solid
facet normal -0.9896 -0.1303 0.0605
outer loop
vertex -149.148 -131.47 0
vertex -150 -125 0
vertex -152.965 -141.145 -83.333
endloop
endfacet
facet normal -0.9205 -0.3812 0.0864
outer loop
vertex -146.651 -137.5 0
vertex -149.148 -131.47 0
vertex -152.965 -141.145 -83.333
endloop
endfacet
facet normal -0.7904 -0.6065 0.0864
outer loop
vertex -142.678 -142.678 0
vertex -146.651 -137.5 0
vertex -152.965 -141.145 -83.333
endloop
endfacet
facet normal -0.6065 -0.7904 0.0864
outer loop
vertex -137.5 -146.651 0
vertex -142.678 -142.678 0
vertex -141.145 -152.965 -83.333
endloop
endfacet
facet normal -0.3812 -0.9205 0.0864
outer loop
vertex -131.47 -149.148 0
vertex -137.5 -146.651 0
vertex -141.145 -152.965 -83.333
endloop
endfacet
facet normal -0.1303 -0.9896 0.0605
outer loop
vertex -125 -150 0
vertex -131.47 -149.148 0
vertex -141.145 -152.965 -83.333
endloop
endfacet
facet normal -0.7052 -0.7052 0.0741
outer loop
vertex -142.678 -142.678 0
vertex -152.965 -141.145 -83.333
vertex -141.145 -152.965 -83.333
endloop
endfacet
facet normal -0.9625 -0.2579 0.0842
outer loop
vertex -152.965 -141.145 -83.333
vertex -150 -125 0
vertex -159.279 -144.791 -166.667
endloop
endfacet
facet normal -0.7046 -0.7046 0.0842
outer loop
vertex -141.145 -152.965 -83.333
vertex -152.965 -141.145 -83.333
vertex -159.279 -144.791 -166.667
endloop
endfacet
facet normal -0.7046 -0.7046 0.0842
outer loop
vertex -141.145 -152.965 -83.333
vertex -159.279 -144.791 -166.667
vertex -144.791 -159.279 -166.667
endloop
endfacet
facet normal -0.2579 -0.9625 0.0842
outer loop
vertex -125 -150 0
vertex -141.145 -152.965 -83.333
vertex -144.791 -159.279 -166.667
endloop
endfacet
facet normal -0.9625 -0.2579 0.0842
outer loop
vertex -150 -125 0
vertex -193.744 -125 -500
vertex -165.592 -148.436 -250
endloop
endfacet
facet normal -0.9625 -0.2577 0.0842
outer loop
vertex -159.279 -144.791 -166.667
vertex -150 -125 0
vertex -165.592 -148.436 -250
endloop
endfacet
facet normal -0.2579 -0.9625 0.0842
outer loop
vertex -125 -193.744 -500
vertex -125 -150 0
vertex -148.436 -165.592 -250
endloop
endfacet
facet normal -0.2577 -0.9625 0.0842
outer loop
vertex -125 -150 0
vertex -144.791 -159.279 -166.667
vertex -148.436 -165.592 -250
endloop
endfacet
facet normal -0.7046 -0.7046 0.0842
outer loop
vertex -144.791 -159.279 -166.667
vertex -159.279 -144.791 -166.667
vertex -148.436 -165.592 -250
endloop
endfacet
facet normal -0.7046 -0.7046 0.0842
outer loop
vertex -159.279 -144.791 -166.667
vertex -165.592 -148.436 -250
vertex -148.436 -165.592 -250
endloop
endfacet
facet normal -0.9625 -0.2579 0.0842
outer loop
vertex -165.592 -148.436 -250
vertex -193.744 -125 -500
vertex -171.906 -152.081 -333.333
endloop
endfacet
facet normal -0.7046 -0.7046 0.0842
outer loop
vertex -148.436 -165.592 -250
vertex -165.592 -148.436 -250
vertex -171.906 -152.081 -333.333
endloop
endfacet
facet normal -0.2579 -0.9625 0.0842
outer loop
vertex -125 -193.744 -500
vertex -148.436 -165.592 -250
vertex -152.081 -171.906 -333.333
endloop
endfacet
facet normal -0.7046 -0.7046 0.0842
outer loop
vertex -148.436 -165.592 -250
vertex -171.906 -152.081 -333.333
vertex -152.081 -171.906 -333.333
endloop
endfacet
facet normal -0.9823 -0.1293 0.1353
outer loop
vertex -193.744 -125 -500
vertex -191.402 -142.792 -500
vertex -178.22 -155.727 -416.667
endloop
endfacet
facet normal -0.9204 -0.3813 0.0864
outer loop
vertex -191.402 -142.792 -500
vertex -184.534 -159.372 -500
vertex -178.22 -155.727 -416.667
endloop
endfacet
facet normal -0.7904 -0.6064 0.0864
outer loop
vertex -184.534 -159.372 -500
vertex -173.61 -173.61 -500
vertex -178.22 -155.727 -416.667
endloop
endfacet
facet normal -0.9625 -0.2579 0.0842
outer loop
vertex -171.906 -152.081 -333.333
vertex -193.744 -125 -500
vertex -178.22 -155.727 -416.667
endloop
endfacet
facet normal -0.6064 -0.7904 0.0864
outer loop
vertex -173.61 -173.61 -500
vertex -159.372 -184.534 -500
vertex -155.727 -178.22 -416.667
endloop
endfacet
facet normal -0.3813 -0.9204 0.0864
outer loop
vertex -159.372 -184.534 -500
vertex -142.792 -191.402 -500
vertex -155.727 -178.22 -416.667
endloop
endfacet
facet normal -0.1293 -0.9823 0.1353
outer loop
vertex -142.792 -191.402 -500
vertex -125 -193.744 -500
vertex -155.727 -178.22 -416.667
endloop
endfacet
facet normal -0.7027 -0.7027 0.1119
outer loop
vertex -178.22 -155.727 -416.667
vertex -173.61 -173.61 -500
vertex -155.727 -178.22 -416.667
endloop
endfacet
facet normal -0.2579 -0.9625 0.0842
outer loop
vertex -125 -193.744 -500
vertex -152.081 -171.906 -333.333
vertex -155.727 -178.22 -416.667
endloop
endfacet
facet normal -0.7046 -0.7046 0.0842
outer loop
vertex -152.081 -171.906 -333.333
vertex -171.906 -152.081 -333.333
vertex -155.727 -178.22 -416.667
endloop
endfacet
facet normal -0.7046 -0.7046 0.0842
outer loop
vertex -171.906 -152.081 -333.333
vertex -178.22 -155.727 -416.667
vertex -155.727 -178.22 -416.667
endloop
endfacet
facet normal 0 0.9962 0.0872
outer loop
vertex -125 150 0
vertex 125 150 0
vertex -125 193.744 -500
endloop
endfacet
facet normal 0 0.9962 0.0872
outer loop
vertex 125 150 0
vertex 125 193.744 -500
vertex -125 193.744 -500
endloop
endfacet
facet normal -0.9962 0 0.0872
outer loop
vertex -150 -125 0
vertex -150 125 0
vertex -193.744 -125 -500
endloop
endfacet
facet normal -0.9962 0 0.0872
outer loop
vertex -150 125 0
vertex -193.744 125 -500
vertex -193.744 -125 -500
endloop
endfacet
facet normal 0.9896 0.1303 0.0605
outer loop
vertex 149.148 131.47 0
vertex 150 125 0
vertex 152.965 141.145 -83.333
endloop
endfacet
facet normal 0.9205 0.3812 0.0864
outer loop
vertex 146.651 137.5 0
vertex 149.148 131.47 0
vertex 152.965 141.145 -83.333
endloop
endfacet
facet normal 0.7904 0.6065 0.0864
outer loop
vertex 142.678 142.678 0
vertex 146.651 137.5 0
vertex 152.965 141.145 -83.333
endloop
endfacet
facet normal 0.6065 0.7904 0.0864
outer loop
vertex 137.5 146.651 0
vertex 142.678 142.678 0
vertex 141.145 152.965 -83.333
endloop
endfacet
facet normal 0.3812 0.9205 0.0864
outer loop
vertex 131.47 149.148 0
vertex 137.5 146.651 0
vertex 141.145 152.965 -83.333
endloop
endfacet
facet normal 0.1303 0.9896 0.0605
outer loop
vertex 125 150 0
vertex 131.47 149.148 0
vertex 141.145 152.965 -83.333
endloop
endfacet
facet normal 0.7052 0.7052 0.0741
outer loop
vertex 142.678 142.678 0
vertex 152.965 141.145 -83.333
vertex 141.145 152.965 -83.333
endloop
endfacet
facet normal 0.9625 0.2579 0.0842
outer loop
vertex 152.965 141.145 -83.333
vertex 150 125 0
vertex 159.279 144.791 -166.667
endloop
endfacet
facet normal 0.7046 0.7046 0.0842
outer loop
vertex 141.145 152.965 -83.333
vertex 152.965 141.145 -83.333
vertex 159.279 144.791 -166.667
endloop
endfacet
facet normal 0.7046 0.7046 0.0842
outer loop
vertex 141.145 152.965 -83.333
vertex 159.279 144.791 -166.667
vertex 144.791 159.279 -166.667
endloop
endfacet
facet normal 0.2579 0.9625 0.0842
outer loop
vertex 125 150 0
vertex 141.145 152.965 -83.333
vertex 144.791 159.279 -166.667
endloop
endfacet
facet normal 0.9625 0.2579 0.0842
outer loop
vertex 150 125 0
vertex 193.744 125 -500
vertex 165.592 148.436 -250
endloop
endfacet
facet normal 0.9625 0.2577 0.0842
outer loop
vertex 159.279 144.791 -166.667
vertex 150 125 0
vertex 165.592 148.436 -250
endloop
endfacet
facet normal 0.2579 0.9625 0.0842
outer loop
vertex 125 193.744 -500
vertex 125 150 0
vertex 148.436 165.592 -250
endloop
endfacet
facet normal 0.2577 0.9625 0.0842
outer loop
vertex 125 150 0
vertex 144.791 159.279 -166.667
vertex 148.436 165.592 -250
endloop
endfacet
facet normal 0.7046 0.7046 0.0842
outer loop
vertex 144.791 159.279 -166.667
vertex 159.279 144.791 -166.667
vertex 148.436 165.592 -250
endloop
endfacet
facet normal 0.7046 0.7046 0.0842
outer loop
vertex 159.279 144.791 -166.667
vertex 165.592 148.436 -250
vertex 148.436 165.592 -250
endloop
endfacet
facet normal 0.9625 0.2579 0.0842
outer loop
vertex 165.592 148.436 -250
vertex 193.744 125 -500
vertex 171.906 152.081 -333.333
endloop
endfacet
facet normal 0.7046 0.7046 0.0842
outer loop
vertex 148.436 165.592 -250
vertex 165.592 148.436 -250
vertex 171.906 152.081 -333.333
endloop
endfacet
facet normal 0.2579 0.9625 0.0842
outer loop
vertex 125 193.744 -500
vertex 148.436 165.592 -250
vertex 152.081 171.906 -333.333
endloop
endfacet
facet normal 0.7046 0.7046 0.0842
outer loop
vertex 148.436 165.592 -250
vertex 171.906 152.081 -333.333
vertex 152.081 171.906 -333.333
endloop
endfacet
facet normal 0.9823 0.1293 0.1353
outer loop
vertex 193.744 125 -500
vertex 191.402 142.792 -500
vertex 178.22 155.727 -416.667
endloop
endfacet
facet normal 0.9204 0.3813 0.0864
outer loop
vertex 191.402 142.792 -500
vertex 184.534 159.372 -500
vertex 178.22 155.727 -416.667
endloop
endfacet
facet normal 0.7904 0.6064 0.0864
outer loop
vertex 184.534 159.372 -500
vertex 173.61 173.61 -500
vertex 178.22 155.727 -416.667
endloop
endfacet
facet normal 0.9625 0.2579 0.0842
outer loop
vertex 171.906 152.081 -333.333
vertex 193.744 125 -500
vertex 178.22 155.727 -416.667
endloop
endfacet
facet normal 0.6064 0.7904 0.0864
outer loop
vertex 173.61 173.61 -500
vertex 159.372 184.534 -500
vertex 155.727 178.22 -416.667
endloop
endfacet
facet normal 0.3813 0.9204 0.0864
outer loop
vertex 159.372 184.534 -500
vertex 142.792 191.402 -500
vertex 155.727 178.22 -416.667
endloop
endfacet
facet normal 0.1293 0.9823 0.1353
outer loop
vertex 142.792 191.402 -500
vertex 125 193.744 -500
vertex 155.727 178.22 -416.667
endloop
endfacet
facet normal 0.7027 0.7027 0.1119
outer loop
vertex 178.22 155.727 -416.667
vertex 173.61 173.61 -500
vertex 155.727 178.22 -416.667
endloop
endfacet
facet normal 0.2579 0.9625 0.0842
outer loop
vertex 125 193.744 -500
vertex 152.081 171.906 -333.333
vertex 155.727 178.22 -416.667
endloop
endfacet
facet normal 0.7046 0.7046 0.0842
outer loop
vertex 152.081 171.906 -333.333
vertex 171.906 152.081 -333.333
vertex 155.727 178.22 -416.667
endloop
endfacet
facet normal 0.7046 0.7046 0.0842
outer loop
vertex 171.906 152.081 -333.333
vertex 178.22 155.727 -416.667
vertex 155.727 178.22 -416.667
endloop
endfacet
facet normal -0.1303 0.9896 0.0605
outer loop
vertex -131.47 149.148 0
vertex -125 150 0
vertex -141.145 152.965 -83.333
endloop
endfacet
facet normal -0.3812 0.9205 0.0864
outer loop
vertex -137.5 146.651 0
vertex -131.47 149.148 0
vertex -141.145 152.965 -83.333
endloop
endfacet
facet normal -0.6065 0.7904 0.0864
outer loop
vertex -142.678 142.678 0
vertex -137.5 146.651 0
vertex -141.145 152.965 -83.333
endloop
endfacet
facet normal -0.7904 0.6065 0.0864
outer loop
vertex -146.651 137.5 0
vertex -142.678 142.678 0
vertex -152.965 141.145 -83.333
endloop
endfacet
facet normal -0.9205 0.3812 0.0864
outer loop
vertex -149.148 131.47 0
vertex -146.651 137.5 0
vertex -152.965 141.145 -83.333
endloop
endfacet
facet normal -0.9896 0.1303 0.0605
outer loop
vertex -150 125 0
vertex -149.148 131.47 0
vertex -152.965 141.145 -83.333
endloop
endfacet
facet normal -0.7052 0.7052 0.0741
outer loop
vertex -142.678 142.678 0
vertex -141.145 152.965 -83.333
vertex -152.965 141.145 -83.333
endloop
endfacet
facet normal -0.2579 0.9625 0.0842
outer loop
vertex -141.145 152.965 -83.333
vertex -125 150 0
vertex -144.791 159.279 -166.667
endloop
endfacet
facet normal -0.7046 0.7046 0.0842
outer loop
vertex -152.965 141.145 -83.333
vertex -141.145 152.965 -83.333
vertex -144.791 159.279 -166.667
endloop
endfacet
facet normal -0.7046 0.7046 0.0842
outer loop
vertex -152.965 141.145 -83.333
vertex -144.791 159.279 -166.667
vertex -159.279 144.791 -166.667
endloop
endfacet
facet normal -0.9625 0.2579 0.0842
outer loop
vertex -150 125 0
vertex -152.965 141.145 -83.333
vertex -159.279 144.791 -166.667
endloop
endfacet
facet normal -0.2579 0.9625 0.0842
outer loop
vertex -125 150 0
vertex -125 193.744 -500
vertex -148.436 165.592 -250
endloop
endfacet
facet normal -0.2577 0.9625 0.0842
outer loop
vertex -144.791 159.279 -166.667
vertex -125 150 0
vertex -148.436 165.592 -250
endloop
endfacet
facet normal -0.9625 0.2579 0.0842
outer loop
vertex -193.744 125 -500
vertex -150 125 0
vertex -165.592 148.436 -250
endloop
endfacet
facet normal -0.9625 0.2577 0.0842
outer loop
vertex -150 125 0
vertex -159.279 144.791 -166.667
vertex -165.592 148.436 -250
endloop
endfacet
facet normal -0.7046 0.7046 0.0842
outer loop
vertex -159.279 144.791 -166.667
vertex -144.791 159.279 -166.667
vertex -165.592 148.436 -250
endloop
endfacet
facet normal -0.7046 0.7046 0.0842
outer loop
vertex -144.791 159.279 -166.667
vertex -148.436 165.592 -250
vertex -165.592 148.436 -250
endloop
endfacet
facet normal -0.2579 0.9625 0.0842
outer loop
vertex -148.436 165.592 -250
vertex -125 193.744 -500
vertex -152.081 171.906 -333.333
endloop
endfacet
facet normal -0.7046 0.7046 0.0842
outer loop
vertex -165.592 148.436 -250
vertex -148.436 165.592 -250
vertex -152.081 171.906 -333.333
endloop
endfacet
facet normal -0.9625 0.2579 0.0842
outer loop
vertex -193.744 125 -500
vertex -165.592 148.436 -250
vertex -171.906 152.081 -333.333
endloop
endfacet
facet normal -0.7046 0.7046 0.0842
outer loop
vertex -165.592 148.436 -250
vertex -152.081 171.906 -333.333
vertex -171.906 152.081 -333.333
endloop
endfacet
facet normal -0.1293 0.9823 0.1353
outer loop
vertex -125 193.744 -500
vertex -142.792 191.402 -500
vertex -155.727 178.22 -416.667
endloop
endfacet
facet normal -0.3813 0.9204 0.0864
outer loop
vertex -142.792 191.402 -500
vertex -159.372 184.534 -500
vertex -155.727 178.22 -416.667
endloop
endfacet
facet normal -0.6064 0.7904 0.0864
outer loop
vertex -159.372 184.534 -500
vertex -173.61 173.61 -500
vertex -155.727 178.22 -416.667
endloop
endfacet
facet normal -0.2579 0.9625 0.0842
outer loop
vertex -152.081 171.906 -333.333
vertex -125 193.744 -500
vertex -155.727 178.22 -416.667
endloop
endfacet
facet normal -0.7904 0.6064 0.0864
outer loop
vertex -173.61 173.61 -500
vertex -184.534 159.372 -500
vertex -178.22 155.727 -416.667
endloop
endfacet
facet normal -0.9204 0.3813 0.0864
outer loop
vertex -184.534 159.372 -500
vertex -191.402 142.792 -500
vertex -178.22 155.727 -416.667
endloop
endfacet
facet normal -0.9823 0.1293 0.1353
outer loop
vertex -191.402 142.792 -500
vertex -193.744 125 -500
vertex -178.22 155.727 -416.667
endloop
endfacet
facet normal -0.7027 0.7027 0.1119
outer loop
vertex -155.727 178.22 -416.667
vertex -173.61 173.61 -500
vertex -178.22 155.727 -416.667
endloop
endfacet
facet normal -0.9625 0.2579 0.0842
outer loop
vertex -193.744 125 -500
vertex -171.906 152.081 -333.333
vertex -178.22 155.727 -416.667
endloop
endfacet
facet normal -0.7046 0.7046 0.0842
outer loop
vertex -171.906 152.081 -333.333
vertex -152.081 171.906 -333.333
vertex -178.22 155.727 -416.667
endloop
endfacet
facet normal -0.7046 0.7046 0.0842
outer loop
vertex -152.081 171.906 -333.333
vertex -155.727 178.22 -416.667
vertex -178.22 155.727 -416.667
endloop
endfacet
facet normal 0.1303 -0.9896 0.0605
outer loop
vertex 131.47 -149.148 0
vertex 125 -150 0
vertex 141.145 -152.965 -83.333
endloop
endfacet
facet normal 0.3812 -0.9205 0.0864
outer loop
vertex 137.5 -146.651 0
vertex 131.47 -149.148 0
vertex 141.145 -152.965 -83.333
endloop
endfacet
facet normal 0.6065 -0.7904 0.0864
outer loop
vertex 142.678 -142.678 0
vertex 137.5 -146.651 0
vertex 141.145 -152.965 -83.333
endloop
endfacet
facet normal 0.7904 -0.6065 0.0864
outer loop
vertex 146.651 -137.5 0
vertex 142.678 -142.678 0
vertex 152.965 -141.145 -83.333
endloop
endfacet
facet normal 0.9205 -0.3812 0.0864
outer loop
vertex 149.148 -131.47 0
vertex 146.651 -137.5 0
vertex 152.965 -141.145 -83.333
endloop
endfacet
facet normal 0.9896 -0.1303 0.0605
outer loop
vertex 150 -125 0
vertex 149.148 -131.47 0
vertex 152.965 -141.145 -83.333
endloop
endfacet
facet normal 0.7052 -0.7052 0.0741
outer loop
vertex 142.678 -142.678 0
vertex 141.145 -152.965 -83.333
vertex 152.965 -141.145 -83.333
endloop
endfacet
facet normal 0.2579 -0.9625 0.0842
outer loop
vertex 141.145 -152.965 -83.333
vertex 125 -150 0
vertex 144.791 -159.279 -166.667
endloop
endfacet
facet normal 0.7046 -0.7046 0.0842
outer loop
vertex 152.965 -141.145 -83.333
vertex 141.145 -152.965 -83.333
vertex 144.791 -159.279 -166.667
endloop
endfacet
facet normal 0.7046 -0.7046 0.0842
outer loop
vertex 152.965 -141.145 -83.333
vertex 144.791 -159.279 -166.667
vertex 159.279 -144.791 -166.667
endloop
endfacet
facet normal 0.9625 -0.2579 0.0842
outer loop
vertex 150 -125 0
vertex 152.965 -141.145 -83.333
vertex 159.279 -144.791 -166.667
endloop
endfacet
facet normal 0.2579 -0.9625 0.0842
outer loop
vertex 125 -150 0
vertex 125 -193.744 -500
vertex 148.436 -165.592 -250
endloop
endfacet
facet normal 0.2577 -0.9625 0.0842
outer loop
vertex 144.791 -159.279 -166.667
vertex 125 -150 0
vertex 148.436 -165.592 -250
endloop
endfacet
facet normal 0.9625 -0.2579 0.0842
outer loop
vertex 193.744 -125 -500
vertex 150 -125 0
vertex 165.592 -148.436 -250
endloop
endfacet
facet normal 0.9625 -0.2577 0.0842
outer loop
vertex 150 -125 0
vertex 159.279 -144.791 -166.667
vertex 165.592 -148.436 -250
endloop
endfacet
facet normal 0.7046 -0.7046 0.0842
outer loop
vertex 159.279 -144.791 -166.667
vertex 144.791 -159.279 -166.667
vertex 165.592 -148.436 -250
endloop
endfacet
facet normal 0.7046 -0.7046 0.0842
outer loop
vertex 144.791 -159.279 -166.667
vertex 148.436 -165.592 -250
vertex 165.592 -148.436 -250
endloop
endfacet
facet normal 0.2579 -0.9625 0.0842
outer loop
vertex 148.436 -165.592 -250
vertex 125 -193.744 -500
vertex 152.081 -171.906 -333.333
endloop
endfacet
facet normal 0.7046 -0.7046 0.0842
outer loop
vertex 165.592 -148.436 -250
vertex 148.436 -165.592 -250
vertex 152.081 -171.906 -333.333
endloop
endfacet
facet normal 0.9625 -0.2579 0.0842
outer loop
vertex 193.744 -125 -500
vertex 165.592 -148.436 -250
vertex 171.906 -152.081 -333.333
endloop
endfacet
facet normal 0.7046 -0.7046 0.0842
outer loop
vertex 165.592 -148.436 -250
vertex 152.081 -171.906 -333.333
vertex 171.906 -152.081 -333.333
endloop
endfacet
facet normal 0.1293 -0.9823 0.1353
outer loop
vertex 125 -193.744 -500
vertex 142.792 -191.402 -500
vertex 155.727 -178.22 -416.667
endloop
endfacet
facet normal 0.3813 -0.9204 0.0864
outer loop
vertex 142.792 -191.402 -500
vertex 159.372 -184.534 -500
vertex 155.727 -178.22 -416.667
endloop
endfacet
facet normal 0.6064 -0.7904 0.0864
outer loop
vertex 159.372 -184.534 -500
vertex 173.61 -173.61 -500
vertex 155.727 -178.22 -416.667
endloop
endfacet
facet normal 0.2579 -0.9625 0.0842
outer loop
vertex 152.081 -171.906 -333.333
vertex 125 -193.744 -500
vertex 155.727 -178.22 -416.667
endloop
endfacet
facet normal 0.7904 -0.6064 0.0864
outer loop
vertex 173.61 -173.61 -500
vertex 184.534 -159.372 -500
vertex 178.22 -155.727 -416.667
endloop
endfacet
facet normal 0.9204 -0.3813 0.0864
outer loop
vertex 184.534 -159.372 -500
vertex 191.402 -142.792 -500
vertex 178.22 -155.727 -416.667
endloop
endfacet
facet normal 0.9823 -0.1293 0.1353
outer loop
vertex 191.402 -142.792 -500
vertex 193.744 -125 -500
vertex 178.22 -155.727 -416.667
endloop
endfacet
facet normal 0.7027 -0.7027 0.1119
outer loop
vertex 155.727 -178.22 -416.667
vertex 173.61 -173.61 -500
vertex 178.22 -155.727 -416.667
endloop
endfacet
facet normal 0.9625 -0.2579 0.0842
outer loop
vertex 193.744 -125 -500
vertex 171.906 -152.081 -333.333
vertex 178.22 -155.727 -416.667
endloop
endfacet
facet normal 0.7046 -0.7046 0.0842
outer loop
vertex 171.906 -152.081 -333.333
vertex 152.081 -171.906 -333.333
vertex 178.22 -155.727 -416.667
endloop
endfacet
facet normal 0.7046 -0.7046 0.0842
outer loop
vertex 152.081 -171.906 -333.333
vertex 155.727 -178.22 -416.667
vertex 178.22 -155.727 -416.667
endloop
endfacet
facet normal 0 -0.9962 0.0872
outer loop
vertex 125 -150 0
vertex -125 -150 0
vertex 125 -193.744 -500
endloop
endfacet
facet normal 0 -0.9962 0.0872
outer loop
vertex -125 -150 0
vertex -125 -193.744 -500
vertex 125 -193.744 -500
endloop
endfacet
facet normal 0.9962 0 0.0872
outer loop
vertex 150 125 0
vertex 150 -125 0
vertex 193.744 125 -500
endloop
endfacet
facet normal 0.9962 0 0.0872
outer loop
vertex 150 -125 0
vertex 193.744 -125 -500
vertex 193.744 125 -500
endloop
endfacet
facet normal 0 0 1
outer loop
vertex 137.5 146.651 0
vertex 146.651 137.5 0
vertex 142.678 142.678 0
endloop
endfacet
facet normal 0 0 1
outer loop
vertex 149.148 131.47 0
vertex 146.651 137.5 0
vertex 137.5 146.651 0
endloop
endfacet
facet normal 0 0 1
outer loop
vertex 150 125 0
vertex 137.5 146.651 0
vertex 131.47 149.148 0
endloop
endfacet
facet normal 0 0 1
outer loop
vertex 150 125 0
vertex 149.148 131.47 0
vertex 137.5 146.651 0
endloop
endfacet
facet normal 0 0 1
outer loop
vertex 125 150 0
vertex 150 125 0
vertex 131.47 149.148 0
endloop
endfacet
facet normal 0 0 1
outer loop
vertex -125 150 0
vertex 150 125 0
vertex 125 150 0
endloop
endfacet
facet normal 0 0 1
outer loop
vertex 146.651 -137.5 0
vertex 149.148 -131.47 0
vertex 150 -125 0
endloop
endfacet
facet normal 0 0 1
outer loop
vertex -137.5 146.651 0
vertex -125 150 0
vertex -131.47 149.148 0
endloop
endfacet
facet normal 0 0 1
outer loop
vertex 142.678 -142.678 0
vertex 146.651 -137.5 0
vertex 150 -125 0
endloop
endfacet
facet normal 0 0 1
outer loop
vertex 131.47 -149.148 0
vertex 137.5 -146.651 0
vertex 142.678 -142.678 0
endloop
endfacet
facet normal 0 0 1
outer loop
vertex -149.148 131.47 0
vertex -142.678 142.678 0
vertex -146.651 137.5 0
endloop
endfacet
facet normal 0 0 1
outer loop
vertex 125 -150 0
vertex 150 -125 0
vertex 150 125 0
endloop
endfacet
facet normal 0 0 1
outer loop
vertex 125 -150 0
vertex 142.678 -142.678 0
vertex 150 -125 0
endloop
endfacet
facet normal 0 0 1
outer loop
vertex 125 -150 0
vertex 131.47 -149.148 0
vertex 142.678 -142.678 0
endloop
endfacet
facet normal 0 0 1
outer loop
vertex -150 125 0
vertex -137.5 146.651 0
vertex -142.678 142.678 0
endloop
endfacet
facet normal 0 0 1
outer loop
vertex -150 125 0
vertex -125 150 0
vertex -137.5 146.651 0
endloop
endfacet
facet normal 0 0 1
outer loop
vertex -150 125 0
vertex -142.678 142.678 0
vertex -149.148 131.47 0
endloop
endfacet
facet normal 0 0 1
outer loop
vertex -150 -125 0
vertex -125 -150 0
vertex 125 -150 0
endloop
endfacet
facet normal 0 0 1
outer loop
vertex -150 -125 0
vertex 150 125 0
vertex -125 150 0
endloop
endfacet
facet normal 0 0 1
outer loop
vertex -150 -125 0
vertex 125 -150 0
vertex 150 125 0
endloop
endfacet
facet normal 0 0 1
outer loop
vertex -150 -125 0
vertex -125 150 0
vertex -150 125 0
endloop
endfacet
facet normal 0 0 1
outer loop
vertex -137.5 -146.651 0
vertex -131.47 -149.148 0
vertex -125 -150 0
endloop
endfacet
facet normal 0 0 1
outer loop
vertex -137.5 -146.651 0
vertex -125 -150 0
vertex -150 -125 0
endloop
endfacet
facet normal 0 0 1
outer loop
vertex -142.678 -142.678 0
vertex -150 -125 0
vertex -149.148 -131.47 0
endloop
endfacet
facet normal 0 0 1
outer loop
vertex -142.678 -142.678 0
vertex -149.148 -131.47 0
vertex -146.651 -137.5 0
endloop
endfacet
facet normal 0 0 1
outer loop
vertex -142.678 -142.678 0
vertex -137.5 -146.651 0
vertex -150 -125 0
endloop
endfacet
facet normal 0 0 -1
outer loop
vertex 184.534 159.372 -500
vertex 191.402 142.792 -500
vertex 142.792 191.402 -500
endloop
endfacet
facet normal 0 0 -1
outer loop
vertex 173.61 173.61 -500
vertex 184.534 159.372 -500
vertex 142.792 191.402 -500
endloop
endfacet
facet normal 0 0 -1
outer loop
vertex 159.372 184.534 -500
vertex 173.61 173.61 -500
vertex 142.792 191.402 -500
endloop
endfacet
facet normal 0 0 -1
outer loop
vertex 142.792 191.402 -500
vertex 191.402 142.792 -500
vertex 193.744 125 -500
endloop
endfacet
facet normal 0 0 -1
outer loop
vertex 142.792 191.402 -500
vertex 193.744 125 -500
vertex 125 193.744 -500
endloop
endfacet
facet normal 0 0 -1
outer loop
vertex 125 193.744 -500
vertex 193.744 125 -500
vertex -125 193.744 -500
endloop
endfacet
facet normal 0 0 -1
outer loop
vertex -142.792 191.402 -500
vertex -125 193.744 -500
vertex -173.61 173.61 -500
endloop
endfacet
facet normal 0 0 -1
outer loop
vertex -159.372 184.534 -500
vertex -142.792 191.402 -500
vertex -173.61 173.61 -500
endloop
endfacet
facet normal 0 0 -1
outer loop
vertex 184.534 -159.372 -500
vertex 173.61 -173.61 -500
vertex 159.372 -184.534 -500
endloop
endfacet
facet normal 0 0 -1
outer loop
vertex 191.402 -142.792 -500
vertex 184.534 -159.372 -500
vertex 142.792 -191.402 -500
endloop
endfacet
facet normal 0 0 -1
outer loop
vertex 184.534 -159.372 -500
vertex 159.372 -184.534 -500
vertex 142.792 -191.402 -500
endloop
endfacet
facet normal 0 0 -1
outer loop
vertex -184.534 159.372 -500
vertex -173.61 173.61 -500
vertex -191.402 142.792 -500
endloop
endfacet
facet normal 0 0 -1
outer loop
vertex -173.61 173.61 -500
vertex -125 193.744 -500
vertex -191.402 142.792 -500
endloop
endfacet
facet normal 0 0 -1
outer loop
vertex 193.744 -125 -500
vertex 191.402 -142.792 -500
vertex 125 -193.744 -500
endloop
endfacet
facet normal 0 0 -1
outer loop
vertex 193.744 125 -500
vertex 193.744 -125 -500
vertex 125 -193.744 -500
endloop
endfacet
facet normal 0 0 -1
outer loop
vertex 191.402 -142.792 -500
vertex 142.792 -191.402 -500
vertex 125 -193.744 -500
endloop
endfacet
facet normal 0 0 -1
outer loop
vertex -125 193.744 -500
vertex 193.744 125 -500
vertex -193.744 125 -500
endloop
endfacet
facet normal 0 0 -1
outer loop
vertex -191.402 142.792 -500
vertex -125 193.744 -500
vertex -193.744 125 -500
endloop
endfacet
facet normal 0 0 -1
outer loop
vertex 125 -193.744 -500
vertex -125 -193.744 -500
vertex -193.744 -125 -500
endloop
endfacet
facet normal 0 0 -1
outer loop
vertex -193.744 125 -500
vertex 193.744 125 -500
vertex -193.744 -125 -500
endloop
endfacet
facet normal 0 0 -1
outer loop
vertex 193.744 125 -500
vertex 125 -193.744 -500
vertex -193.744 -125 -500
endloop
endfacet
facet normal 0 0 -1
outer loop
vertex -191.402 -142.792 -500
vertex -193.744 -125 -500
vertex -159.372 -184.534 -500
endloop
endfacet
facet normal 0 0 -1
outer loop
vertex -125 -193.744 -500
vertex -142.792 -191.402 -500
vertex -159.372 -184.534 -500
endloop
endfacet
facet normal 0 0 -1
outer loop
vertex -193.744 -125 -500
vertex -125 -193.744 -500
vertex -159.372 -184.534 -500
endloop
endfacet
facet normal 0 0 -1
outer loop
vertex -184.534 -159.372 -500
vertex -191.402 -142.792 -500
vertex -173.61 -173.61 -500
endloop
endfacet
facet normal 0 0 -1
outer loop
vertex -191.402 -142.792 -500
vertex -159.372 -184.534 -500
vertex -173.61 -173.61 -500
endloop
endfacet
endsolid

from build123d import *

# Parameters (mm, degrees)
F1_DEPTH = 500
F1_TAPER = -5


with BuildPart() as f1:
    # F0 (on Top) → F1 (new body)
    with BuildSketch(Plane.XY):
        with BuildLine():
            ThreePointArc((-150, -125), (-142.6776695297, -142.6776695297), (-125, -150))
            Line((-125, -150), (125, -150))
            ThreePointArc((125, -150), (142.6776695297, -142.6776695297), (150, -125))
            Line((150, -125), (150, 125))
            ThreePointArc((150, 125), (142.6776695297, 142.6776695297), (125, 150))
            Line((125, 150), (-125, 150))
            ThreePointArc((-125, 150), (-142.6776695297, 142.6776695297), (-150, 125))
            Line((-150, 125), (-150, -125))
        make_face()
    extrude(amount=-F1_DEPTH, taper=F1_TAPER)


solid = f1.part
